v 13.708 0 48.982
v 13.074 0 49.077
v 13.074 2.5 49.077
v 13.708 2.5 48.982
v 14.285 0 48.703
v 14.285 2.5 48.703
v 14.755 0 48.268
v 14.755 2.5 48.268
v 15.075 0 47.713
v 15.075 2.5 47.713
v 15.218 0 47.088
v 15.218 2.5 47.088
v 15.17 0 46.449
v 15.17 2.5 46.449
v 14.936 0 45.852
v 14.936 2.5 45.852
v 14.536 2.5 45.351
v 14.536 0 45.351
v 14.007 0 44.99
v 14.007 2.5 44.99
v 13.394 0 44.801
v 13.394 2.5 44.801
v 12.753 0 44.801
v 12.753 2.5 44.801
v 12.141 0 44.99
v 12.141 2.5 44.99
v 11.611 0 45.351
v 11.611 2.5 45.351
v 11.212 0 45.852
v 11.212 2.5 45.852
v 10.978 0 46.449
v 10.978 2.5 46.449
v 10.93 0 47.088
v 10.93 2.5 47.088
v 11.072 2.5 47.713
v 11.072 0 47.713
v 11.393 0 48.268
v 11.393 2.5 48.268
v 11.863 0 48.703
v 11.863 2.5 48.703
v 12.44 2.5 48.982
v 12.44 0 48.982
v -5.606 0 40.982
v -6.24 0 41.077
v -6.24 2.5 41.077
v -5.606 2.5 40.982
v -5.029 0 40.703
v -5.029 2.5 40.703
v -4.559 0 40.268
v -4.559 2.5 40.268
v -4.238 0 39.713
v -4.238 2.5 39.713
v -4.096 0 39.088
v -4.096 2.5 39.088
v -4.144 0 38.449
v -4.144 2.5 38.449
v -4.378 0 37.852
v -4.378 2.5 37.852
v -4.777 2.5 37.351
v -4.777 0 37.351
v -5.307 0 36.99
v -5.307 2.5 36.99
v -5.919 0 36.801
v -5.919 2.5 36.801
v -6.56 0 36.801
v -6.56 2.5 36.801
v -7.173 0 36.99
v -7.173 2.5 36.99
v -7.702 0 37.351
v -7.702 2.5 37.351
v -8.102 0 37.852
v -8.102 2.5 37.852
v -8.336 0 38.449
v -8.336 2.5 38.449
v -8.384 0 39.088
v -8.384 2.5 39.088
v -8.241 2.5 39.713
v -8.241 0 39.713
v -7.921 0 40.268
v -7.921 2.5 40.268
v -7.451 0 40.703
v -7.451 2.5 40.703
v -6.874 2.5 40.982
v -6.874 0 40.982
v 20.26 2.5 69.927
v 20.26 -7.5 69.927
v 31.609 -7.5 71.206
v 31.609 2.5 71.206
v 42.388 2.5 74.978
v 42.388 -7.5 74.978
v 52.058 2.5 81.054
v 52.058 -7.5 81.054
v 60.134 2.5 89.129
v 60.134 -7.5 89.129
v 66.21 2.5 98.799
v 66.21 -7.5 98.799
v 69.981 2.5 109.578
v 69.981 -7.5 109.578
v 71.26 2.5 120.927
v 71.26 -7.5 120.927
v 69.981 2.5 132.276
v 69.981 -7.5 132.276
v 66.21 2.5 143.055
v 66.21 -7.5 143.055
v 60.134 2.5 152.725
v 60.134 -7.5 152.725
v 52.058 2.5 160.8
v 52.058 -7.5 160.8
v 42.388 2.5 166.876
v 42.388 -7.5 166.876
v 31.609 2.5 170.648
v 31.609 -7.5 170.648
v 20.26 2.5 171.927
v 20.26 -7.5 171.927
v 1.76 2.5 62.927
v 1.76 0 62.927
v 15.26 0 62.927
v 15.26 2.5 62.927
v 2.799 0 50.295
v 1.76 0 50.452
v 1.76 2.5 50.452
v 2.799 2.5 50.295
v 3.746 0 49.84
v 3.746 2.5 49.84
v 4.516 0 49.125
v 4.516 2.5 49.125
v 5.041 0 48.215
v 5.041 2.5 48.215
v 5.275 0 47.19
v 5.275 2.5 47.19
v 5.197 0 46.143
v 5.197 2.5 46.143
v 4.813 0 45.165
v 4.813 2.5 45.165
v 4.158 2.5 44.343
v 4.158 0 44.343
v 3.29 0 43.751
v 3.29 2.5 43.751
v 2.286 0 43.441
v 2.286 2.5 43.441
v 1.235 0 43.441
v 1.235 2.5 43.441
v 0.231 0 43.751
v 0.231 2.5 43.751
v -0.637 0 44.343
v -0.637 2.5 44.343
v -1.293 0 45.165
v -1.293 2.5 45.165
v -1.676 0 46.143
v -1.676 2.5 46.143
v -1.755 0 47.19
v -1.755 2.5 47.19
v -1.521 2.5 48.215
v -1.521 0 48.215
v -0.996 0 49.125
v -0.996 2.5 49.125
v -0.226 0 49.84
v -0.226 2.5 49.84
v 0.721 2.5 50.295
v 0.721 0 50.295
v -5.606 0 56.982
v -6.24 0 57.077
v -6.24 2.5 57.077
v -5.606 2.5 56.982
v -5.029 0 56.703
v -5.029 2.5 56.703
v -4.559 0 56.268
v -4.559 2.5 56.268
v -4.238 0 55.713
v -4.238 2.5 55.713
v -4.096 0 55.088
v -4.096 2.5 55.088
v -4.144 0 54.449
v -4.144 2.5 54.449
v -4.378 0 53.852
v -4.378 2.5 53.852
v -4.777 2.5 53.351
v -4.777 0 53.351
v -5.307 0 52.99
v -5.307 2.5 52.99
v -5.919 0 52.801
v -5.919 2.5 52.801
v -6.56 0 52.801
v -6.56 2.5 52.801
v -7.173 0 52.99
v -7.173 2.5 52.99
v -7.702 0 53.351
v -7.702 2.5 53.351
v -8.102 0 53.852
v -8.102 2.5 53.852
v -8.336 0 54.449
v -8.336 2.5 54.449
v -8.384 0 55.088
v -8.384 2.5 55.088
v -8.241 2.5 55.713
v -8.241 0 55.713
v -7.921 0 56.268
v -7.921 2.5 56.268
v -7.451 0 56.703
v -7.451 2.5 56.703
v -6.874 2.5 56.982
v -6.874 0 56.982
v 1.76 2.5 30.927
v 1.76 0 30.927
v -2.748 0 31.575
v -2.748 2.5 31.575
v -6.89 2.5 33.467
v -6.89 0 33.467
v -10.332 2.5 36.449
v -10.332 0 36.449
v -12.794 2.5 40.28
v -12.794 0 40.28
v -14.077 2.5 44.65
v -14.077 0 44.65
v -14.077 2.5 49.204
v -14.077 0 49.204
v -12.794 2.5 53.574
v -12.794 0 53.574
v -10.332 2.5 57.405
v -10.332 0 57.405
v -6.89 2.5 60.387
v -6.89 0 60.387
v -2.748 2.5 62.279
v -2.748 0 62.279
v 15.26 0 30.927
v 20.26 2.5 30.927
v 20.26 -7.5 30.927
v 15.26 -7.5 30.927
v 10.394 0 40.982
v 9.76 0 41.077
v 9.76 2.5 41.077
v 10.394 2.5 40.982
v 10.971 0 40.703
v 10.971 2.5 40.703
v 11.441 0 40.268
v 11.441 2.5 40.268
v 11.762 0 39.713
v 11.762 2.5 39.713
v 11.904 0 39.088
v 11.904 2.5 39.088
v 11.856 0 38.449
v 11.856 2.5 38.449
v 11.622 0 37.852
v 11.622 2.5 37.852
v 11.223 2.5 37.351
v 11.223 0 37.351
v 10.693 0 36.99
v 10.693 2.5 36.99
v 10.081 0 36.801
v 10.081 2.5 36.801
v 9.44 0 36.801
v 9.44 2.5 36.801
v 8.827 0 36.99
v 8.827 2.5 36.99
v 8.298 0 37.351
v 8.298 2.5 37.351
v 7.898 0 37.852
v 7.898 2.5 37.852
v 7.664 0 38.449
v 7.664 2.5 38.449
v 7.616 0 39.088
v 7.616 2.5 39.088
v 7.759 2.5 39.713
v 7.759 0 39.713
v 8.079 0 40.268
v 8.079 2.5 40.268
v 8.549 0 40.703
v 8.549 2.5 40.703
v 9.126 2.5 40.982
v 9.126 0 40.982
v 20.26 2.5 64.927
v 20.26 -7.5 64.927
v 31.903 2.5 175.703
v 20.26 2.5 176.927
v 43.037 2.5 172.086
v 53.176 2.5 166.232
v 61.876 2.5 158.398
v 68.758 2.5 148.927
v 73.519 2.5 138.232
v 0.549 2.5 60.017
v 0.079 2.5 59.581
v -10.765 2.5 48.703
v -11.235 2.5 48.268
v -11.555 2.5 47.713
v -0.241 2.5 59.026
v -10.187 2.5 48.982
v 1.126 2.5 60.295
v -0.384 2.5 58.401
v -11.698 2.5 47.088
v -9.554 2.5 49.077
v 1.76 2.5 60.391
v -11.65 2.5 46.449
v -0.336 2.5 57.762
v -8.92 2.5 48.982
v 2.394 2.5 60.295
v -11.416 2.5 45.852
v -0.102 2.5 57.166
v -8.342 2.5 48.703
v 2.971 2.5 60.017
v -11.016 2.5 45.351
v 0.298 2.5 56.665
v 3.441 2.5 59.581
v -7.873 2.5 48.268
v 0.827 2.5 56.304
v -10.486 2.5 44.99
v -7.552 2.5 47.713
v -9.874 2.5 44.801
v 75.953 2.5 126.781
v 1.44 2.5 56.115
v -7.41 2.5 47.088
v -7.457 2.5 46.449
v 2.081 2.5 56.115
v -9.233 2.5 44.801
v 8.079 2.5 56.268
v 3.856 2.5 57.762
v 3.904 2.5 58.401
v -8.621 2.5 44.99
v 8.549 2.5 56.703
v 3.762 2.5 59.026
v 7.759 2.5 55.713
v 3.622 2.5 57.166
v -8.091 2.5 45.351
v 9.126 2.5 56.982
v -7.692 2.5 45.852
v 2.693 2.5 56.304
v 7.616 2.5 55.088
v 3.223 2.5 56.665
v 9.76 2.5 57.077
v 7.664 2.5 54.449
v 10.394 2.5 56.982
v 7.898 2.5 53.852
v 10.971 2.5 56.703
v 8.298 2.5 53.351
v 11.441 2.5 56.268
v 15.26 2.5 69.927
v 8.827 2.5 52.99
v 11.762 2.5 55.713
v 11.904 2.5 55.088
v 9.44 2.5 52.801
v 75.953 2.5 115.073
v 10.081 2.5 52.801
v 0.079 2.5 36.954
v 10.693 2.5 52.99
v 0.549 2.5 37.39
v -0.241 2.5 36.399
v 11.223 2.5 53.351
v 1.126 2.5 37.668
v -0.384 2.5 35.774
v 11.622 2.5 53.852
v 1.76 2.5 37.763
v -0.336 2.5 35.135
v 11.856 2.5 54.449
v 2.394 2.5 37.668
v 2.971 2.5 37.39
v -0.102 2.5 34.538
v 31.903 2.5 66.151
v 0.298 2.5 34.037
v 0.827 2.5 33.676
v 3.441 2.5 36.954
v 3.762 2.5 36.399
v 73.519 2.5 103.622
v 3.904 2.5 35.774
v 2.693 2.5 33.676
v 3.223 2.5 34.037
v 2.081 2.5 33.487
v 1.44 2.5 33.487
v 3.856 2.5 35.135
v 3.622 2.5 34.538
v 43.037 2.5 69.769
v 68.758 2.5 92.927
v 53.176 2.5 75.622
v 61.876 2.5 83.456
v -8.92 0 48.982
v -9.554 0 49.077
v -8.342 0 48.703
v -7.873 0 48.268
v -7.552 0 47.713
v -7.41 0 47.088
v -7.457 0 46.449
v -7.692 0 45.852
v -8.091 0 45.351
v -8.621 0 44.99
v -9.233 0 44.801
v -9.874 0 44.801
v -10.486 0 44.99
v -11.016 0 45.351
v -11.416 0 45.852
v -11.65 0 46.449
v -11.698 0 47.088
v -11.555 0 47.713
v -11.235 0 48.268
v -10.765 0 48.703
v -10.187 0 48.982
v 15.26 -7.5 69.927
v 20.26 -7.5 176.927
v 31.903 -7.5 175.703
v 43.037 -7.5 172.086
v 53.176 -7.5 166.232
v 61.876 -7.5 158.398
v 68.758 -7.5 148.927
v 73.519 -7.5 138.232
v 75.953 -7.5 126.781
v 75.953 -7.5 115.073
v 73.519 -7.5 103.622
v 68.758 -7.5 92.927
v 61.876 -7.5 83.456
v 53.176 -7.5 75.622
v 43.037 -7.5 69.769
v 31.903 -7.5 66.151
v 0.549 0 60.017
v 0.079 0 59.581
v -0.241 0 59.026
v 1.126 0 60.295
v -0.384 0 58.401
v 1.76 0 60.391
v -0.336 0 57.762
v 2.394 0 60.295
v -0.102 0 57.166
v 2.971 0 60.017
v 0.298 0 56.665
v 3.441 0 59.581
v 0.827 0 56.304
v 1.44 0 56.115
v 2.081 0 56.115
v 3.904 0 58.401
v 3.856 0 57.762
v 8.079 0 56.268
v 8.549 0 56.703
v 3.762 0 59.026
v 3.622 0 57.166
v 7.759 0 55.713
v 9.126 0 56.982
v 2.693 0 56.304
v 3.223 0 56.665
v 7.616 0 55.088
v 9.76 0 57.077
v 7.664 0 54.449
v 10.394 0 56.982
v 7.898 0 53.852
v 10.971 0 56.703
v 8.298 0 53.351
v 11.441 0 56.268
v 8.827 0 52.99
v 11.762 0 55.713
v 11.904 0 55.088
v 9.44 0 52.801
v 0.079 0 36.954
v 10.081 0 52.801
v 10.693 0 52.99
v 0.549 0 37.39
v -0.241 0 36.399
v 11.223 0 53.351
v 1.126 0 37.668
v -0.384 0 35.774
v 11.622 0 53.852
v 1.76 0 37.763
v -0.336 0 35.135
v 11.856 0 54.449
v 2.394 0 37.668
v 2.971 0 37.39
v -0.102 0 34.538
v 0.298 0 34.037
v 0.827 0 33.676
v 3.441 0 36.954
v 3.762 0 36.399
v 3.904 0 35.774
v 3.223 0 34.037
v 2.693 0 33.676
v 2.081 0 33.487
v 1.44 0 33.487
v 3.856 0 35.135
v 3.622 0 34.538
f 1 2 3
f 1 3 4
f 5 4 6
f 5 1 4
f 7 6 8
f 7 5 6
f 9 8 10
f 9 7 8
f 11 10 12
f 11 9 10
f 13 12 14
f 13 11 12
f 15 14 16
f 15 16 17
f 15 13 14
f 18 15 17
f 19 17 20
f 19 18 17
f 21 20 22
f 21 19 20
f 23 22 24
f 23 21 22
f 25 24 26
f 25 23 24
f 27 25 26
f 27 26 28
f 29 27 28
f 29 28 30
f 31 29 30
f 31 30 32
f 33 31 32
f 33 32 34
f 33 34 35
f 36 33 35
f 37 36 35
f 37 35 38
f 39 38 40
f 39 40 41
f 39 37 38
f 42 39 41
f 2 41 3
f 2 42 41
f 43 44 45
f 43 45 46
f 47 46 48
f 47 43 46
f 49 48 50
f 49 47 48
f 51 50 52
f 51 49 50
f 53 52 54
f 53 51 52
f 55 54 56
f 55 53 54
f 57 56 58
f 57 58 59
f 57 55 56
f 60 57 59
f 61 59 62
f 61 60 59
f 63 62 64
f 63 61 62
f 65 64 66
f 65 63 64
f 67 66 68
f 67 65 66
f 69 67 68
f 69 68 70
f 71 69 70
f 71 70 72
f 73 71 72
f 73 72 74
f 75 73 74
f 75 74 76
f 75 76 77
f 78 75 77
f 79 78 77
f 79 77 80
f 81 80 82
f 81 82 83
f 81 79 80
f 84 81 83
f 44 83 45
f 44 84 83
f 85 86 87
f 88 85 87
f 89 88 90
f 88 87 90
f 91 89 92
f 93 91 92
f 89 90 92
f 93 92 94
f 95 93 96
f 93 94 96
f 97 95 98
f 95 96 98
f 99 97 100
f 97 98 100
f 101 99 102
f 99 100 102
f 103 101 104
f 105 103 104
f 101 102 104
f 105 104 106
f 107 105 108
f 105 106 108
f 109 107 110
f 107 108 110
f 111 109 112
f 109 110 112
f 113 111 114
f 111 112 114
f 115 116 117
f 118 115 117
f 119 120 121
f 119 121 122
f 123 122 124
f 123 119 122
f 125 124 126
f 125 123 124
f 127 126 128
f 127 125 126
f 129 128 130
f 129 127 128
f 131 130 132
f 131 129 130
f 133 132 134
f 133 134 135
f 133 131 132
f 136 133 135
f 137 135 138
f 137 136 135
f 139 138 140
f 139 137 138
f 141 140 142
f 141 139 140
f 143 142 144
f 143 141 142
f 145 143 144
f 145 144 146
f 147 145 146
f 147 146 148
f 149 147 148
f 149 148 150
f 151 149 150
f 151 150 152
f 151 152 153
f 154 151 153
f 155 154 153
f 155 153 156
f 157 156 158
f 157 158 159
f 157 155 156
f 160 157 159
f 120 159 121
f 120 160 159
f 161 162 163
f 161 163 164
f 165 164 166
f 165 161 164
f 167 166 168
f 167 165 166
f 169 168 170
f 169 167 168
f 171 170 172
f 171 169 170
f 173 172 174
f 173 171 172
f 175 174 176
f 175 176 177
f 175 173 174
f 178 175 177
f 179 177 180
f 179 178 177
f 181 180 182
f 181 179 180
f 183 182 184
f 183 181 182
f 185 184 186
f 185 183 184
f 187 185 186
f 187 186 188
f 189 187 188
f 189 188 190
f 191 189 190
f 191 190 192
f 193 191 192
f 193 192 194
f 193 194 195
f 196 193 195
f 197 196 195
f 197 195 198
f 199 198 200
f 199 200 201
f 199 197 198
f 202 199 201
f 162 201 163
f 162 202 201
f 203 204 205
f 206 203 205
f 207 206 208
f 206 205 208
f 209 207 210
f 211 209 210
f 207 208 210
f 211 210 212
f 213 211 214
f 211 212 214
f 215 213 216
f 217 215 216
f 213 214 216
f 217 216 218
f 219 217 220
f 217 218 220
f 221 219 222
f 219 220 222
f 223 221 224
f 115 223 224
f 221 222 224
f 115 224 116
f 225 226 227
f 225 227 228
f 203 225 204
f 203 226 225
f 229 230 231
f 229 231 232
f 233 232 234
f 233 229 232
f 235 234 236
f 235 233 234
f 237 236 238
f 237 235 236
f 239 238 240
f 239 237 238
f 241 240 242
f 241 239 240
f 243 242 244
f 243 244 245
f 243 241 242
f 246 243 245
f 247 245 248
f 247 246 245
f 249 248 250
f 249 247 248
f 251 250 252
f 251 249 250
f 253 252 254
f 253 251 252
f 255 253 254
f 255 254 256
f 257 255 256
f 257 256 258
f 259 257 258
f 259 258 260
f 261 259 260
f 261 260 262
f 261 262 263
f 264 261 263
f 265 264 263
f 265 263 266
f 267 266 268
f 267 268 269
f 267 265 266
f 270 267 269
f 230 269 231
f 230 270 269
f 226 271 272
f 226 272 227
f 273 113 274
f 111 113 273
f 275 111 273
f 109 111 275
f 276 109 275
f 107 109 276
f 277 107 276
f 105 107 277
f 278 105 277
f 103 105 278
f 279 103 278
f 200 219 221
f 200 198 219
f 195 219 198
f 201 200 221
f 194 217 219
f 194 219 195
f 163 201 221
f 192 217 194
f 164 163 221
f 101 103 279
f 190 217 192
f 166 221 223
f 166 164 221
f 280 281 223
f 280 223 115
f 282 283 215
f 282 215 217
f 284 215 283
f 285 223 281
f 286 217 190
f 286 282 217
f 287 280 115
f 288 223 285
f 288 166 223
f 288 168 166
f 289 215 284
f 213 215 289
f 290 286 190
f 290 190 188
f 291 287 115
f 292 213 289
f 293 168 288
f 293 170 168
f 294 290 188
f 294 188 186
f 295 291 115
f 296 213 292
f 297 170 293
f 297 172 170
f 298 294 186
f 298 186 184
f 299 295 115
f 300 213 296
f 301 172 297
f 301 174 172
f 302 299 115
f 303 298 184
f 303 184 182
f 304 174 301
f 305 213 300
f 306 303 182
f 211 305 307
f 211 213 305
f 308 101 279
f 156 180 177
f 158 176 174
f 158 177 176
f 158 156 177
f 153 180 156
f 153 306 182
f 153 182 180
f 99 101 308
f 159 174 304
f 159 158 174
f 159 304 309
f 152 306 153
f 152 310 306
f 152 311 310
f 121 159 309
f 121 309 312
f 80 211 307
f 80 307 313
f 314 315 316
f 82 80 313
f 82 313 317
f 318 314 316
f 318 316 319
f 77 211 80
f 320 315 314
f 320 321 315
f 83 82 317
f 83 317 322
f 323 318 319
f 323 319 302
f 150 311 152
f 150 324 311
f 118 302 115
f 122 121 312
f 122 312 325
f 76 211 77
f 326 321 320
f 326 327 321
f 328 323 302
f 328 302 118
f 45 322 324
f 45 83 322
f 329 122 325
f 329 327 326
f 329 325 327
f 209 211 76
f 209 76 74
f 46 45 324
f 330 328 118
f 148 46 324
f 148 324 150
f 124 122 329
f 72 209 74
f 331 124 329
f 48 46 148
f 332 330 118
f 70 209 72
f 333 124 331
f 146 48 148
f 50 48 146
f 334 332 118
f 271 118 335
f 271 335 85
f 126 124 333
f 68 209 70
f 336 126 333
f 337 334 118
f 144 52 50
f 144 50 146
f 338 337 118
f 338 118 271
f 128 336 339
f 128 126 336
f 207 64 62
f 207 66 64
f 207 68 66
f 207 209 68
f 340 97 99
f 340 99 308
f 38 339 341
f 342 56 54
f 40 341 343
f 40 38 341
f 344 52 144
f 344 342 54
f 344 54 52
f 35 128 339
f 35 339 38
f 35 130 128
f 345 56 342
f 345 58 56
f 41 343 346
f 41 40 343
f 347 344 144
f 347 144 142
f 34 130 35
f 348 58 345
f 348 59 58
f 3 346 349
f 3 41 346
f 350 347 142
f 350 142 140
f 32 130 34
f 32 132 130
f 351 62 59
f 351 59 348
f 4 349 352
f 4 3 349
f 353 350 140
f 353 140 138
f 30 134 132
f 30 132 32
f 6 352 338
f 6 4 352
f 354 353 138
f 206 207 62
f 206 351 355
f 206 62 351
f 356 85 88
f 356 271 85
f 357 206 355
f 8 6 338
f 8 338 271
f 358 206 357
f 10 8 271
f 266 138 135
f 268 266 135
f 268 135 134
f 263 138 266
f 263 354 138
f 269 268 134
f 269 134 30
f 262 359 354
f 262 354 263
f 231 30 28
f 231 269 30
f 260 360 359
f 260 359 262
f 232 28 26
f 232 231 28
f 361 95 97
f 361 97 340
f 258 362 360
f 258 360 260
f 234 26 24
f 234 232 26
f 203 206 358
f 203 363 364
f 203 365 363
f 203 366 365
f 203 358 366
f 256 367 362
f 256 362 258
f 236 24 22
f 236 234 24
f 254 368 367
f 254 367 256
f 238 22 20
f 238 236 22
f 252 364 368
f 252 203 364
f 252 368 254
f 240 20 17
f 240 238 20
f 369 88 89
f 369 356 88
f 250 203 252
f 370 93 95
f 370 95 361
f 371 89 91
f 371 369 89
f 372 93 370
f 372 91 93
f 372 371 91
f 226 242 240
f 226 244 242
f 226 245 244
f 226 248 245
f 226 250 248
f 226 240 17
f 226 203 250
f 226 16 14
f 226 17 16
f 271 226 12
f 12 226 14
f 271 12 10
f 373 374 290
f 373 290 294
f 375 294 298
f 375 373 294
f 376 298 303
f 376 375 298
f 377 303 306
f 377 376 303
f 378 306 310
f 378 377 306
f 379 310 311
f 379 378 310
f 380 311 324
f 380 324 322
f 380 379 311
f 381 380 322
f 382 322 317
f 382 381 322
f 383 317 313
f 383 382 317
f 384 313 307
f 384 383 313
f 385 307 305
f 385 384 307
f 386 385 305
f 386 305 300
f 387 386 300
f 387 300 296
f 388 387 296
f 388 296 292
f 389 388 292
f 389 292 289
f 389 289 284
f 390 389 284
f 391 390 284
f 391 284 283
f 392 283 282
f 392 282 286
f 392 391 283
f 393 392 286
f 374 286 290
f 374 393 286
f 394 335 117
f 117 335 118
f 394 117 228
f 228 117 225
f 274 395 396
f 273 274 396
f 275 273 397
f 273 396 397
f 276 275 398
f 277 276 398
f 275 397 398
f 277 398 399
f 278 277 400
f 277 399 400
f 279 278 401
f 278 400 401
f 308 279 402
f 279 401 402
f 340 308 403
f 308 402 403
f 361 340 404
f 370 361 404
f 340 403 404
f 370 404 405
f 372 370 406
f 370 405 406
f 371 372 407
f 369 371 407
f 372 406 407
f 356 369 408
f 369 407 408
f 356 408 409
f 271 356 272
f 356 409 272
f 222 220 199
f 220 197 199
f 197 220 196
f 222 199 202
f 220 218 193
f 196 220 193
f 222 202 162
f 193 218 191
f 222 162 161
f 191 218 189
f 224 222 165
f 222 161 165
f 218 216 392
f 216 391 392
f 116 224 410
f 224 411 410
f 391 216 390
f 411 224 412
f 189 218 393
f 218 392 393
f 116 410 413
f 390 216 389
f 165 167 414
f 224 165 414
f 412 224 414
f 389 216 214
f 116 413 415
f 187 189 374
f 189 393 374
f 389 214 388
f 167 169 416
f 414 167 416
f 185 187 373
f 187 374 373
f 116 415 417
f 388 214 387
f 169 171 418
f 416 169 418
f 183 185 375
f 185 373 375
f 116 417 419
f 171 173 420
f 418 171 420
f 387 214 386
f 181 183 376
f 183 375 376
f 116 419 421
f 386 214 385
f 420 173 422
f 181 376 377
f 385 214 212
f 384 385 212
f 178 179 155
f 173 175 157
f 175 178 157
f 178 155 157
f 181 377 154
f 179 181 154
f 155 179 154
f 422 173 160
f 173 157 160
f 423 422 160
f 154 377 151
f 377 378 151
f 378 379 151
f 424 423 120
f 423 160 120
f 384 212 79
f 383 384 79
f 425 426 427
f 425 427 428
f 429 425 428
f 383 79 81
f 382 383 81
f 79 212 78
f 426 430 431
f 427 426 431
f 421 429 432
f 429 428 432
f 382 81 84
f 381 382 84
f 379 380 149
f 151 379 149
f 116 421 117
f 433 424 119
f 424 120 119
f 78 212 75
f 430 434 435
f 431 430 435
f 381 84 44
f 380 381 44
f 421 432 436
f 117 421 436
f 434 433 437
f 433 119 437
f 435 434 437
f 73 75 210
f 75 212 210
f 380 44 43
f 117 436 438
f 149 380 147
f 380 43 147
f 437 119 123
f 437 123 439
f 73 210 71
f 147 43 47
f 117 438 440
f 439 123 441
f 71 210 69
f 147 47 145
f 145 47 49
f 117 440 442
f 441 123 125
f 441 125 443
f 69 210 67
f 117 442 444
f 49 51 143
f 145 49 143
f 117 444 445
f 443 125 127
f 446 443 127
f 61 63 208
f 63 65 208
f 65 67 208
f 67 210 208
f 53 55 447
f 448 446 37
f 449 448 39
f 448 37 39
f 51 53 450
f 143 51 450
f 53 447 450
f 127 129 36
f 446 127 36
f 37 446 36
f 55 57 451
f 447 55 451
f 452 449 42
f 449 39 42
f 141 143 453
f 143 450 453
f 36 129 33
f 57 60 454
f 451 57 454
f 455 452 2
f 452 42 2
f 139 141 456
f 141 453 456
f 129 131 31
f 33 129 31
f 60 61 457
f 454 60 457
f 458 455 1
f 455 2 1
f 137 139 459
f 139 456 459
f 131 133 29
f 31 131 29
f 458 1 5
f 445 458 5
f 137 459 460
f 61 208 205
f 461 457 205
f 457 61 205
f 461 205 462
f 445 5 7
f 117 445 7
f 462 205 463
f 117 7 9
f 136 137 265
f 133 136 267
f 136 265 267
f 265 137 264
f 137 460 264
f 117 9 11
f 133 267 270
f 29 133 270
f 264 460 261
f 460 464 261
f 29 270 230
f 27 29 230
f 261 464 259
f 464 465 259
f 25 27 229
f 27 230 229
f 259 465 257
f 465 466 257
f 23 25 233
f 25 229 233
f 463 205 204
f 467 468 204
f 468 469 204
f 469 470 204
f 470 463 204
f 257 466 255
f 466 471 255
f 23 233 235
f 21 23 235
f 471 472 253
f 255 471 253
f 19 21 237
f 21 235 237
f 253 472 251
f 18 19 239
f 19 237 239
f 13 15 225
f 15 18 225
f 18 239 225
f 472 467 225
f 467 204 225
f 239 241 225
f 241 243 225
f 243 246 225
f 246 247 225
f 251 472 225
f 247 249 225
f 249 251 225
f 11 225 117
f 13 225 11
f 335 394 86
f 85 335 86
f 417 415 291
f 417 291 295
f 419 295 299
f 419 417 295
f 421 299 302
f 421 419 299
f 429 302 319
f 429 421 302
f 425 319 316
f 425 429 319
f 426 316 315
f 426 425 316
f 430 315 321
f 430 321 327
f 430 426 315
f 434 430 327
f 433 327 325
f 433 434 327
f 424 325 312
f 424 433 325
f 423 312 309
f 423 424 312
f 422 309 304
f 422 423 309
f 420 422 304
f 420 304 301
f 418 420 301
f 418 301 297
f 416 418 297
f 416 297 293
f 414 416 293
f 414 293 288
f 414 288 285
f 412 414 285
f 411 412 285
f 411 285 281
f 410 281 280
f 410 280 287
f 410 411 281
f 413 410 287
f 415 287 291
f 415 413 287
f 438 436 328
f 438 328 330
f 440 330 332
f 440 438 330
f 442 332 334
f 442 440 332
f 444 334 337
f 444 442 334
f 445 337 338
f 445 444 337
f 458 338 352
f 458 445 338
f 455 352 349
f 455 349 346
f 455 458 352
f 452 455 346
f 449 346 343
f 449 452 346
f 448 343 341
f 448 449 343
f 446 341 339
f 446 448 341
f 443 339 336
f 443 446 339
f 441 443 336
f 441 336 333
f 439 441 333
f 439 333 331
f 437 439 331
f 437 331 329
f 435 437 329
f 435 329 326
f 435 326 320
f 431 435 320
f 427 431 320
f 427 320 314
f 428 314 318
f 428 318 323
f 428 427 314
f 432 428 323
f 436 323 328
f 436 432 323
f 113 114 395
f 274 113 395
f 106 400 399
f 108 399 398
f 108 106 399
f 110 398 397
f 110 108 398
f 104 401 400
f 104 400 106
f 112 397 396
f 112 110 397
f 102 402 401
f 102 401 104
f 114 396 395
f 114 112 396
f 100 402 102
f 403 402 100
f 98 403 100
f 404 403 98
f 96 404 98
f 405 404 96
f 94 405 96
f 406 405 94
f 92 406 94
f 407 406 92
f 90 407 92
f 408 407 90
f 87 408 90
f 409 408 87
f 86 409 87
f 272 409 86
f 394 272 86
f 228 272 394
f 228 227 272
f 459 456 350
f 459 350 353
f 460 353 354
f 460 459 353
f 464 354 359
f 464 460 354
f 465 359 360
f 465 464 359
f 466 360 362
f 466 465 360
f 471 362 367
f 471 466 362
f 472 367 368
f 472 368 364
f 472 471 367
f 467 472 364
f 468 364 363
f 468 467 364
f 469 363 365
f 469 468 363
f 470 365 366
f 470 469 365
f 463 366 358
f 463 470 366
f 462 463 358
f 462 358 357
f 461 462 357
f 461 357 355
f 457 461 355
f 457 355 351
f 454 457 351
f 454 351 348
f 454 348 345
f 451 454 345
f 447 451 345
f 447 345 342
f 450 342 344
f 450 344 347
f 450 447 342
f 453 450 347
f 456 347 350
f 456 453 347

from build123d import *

# Parameters (mm, degrees)
SKETCH4_W                = 18.5
SKETCH4_H                = 32
BOSS_EXTRUDE2_DEPTH      = 2.5
SKETCH5_R                = 16
BOSS_EXTRUDE3_DEPTH      = 2.5
BOSS_EXTRUDE4_DEPTH      = 2.5
BOSS_EXTRUDE4_DEPTH_BACK = 7.5
SKETCH6_W                = 5
SKETCH6_H                = 7
SKETCH9_R                = 2.15
CUT_EXTRUDE1_DEPTH       = 2.5
SKETCH9_3_R              = 3.525
CUT_EXTRUDE3_DEPTH       = 2.5
BOSS_EXTRUDE7_DEPTH      = 10
SKETCH16_W               = 5
SKETCH16_H               = 32
BOSS_EXTRUDE8_DEPTH      = 7.5


with BuildPart() as part:
    # Sketch4 → Boss-Extrude2 (new body)
    with BuildSketch(Plane(origin=(0, 0, 0), x_dir=(1, 0, 0), z_dir=(0, 1, 0))):
        with Locations((11.010130113, -46.927053824)):
            Rectangle(SKETCH4_W, SKETCH4_H)
    extrude(amount=BOSS_EXTRUDE2_DEPTH)

    # Sketch5 → Boss-Extrude3 (add)
    with BuildSketch(Plane(origin=(0, 0, 0), x_dir=(1, 0, 0), z_dir=(0, 1, 0))):
        with Locations((1.760130113, -46.927053824)):
            Circle(SKETCH5_R)
    extrude(amount=BOSS_EXTRUDE3_DEPTH)

    # Sketch6 → Boss-Extrude4 (add, two sides: drawn at the far end of the back side and taken through both)
    with BuildSketch(Plane(origin=(0, 0, 0), x_dir=(1, 0, 0), z_dir=(0, 1, 0)).offset(-BOSS_EXTRUDE4_DEPTH_BACK)):
        with Locations((17.760130113, -66.427053824)):
            Rectangle(SKETCH6_W, SKETCH6_H)
    extrude(amount=BOSS_EXTRUDE4_DEPTH + BOSS_EXTRUDE4_DEPTH_BACK)

    # Sketch9 → Cut-Extrude1 (cut)
    with BuildSketch(Plane(origin=(0, 0, 0), x_dir=(1, 0, 0), z_dir=(0, 1, 0))):
        with Locations((1.760130113, -35.613345325)):
            Circle(SKETCH9_R)
        with Locations((9.760130113, -38.927053824)):
            Circle(SKETCH9_R)
        with Locations((13.073838612, -46.927053824)):
            Circle(SKETCH9_R)
        with Locations((9.760130113, -54.927053824)):
            Circle(SKETCH9_R)
        with Locations((1.760130113, -58.240762323)):
            Circle(SKETCH9_R)
        with Locations((-6.239869887, -54.927053824)):
            Circle(SKETCH9_R)
        with Locations((-9.553578386, -46.927053824)):
            Circle(SKETCH9_R)
        with Locations((-6.239869887, -38.927053824)):
            Circle(SKETCH9_R)
    extrude(amount=CUT_EXTRUDE1_DEPTH, mode=Mode.SUBTRACT)

    # Sketch9<3> → Cut-Extrude3 (cut)
    with BuildSketch(Plane(origin=(0, 0, 0), x_dir=(1, 0, 0), z_dir=(0, 1, 0))):
        with Locations((1.760130113, -46.927053824)):
            Circle(SKETCH9_3_R)
    extrude(amount=CUT_EXTRUDE3_DEPTH, mode=Mode.SUBTRACT)

    # Sketch14 → Boss-Extrude7 (add)
    with BuildSketch(Plane(origin=(0, -7.5, 0), x_dir=(-1, 0, 0), z_dir=(0, -1, 0))):
        with BuildLine():
            Line((-20.260130113, -171.927053824), (-20.260130113, -176.927053824))
            ThreePointArc((-20.260130113, -176.927053824), (-76.260130113, -120.927053824), (-20.260130113, -64.927053824))
            Line((-20.260130113, -64.927053824), (-20.260130113, -69.927053824))
            ThreePointArc((-20.260130113, -69.927053824), (-71.260130113, -120.927053824), (-20.260130113, -171.927053824))
        make_face()
    extrude(amount=-BOSS_EXTRUDE7_DEPTH)

    # Sketch16 → Boss-Extrude8 (add)
    with BuildSketch(Plane(origin=(0, 0, 0), x_dir=(-1, 0, 0), z_dir=(0, -1, 0))):
        with Locations((-17.760130113, -46.927053824)):
            Rectangle(SKETCH16_W, SKETCH16_H)
    extrude(amount=BOSS_EXTRUDE8_DEPTH)


solid = part.part
